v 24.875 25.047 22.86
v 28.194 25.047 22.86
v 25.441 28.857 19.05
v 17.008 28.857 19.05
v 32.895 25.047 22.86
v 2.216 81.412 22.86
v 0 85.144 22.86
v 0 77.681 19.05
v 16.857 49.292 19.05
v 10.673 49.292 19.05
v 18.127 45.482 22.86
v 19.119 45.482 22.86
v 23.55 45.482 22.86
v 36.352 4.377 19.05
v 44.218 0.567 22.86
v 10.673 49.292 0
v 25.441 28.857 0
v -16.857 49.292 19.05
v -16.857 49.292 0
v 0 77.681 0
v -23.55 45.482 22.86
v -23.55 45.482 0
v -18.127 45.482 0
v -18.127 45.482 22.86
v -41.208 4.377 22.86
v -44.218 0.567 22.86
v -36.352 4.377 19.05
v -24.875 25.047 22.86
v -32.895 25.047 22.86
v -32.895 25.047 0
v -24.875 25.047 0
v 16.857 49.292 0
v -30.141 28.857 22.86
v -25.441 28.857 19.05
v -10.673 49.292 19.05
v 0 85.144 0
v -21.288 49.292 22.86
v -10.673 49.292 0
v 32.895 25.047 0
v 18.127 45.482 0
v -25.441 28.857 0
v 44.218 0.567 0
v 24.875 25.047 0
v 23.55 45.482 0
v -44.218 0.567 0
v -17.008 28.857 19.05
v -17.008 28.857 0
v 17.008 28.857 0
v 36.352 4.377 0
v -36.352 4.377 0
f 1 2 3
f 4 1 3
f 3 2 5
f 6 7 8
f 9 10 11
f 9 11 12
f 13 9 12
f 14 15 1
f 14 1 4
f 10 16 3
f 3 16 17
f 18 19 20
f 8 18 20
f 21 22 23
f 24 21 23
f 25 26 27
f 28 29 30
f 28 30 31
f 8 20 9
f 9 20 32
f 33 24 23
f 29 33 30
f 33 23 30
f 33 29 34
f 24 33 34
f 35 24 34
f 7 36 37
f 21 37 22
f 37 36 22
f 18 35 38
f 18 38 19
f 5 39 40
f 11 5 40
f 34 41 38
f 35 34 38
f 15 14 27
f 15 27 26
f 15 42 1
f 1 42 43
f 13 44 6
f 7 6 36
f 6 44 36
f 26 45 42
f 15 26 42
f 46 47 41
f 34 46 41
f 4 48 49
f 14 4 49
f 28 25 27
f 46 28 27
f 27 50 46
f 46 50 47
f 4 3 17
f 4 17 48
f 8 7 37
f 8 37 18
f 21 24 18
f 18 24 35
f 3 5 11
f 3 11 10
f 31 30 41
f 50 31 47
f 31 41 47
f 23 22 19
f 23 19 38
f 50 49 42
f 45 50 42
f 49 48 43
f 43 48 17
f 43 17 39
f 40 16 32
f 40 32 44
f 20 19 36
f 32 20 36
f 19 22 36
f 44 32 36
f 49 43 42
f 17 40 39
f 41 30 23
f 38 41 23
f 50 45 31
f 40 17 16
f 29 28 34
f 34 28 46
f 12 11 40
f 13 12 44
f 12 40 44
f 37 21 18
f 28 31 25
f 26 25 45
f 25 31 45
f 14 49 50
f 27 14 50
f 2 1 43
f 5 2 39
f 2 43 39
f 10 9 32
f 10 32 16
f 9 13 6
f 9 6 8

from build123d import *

# Parameters (mm, degrees)
F1_DEPTH     = 25.4
F2_T4_DEPTH  = 57.8731292872
F2_T9_DEPTH  = 41.0926802964
F2_T14_DEPTH = 63.860720941
F2_T19_DEPTH = 105.3637727113
F2_T25_DEPTH = 63.860720941
F2_T30_DEPTH = 41.0926802964
F2_T35_DEPTH = 57.8731292872
F2_T40_DEPTH = 38.84406527
F2_T45_DEPTH = 65.6766537471
F2_T51_DEPTH = 65.6766537471
F2_T57_DEPTH = 38.84406527


# Not quite as in the source:
# - a fillet or chamfer that OpenCascade refuses, or shapes differently, is made with other operations: its cross-section is extruded or revolved along the edge and cut away or added


with BuildPart() as f1:
    # F0 (on Top) → F1 (new body)
    with BuildSketch(Plane.XY):
        Polygon((-44.2180235174, 0.5666213692), (0, 0.5666213692), (44.2180235174, 0.5666213692), (24.8746419192, 25.0471287349), (32.8946120205, 25.0471287349), (18.1270946377, 45.4824770849), (23.5501605907, 45.4824770849), (0, 85.1436531389), (-23.5501605907, 45.4824770849), (-18.1270946377, 45.4824770849), (-32.8946120205, 25.0471287349), (-24.8746419192, 25.0471287349), align=None)
        Polygon((36.3516993821, 4.3766213692), (0, 4.3766213692), (-36.3516993821, 4.3766213692), (-17.0083177839, 28.8571287349), (-25.4406241332, 28.8571287349), (-10.6731067504, 49.2924770849), (-16.8567980732, 49.2924770849), (0, 77.6812616757), (16.8567980732, 49.2924770849), (10.6731067504, 49.2924770849), (25.4406241332, 28.8571287349), (17.0083177839, 28.8571287349), align=None, mode=Mode.SUBTRACT)
    extrude(amount=F1_DEPTH)

    # F2: chamfer of 6.35 on 11 edges, made by hand


with BuildPart() as f2_tool2:
    # F2_s3 → F2_t4 (new body)
    with BuildSketch(Plane(origin=(-29.3040400955, 40.5510453716, 0), x_dir=(0, 0, 1), z_dir=(0.585716126, -0.8105162674, 0))):
        Polygon((25.4, -43.8721253629), (19.05, -37.5221253629), (25.4, -37.5221253629), align=None)
    extrude(amount=F2_T4_DEPTH)

    split(bisect_by=Plane(origin=(0, 23.9535643674, 23.9535643674), x_dir=(1, 0, 0), z_dir=(0, 0.7071067812, 0.7071067812)), keep=Keep.TOP)


with BuildPart() as f1_1:
    add(f1.part)

    # F2_t1: cut F2_tool2
    add(f2_tool2.part, mode=Mode.SUBTRACT)


with BuildPart() as f2_tool7:
    # F2_s8 → F2_t9 (new body)
    with BuildSketch(Plane.YZ.offset(41.7708111067)):
        Polygon((22.5071287349, 25.4), (28.8571287349, 19.05), (28.8571287349, 25.4), align=None)
    extrude(amount=-F2_T9_DEPTH)

    split(bisect_by=Plane(origin=(7.4859790504, 5.409710853, -9.2360626814), x_dir=(0.585716126, -0.8105162674, 0), z_dir=(-0.573121549, -0.4141638445, 0.7071067812)), keep=Keep.TOP)


with BuildPart() as f1_2:
    add(f1_1.part)

    # F2_t6: cut F2_tool7
    add(f2_tool7.part, mode=Mode.SUBTRACT)


with BuildPart() as f2_tool12:
    # F2_s13 → F2_t14 (new body)
    with BuildSketch(Plane(origin=(-17.6242588903, 22.3048280047, 0), x_dir=(0, 0, 1), z_dir=(0.6199732843, -0.7846229201, 0))):
        Polygon((25.4, -37.5857648435), (19.05, -31.2357648435), (25.4, -31.2357648435), align=None)
    extrude(amount=F2_T14_DEPTH)

    split(bisect_by=Plane(origin=(0, 11.7133106846, 11.7133106846), x_dir=(1, 0, 0), z_dir=(0, 0.7071067812, 0.7071067812)), keep=Keep.TOP)


with BuildPart() as f1_3:
    add(f1_2.part)

    # F2_t11: cut F2_tool12
    add(f2_tool12.part, mode=Mode.SUBTRACT)


with BuildPart() as f2_tool17:
    # F2_s18 → F2_t19 (new body)
    with BuildSketch(Plane.YZ.offset(-52.6818863557)):
        Polygon((-1.9733786308, 25.4), (4.3766213692, 19.05), (4.3766213692, 25.4), align=None)
    extrude(amount=F2_T19_DEPTH)

    split(bisect_by=Plane(origin=(4.7806151974, 3.7774243261, -6.0928824217), x_dir=(0.6199732843, -0.7846229201, 0), z_dir=(-0.5548121875, -0.4383873135, 0.7071067812)), keep=Keep.TOP)

    split(bisect_by=Plane(origin=(-4.7806151974, 3.7774243261, -6.0928824217), x_dir=(0.6199732843, 0.7846229201, 0), z_dir=(0.5548121875, -0.4383873135, 0.7071067812)), keep=Keep.TOP)


with BuildPart() as f1_4:
    add(f1_3.part)

    # F2_t16: cut F2_tool17
    add(f2_tool17.part, mode=Mode.SUBTRACT)


with BuildPart() as f2_tool23:
    # F2_s24 → F2_t25 (new body)
    with BuildSketch(Plane(origin=(-21.9676820116, -27.8017573382, 0), x_dir=(0, 0, 1), z_dir=(0.6199732843, 0.7846229201, 0))):
        Polygon((25.4, -37.5857648435), (19.05, -31.2357648435), (25.4, -31.2357648435), align=None)
    extrude(amount=F2_T25_DEPTH)

    split(bisect_by=Plane(origin=(0, 11.7133106846, 11.7133106846), x_dir=(1, 0, 0), z_dir=(0, 0.7071067812, 0.7071067812)), keep=Keep.TOP)


with BuildPart() as f1_5:
    add(f1_4.part)

    # F2_t22: cut F2_tool23
    add(f2_tool23.part, mode=Mode.SUBTRACT)


with BuildPart() as f2_tool28:
    # F2_s29 → F2_t30 (new body)
    with BuildSketch(Plane.YZ.offset(-0.6781308103)):
        Polygon((22.5071287349, 25.4), (28.8571287349, 19.05), (28.8571287349, 25.4), align=None)
    extrude(amount=-F2_T30_DEPTH)

    split(bisect_by=Plane(origin=(-7.4859790504, 5.409710853, -9.2360626814), x_dir=(0.585716126, 0.8105162674, 0), z_dir=(0.573121549, -0.4141638445, 0.7071067812)), keep=Keep.TOP)


with BuildPart() as f1_6:
    add(f1_5.part)

    # F2_t27: cut F2_tool28
    add(f2_tool28.part, mode=Mode.SUBTRACT)


with BuildPart() as f2_tool33:
    # F2_s34 → F2_t35 (new body)
    with BuildSketch(Plane(origin=(-4.5931849883, -6.3560673631, 0), x_dir=(0, 0, 1), z_dir=(0.585716126, 0.8105162674, 0))):
        Polygon((25.4, -43.8721253629), (19.05, -37.5221253629), (25.4, -37.5221253629), align=None)
    extrude(amount=F2_T35_DEPTH)

    split(bisect_by=Plane(origin=(0, 23.9535643674, 23.9535643674), x_dir=(1, 0, 0), z_dir=(0, 0.7071067812, 0.7071067812)), keep=Keep.TOP)


with BuildPart() as f1_7:
    add(f1_6.part)

    # F2_t32: cut F2_tool33
    add(f2_tool33.part, mode=Mode.SUBTRACT)


with BuildPart() as f2_tool38:
    # F2_s39 → F2_t40 (new body)
    with BuildSketch(Plane.YZ.offset(5.6570802232)):
        Polygon((42.9424770849, 25.4), (49.2924770849, 19.05), (49.2924770849, 25.4), align=None)
    extrude(amount=-F2_T40_DEPTH)

    split(bisect_by=Plane(origin=(-8.8610845664, 5.2615677423, -10.3054798432), x_dir=(0.5105601896, 0.8598420162, 0), z_dir=(0.6080001204, -0.3610205722, 0.7071067812)), keep=Keep.TOP)


with BuildPart() as f1_8:
    add(f1_7.part)

    # F2_t37: cut F2_tool38
    add(f2_tool38.part, mode=Mode.SUBTRACT)


with BuildPart() as f2_tool43:
    # F2_s44 → F2_t45 (new body)
    with BuildSketch(Plane(origin=(8.9078181115, 15.0017890968, 0), x_dir=(0, 0, 1), z_dir=(0.5105601896, 0.8598420162, 0))):
        Polygon((25.4, -46.0109596864), (19.05, -39.6609596864), (25.4, -39.6609596864), align=None)
    extrude(amount=F2_T45_DEPTH)

    split(bisect_by=Plane(origin=(0, 34.1712385424, 34.1712385424), x_dir=(1, 0, 0), z_dir=(0, 0.7071067812, 0.7071067812)), keep=Keep.TOP)

    split(bisect_by=Plane(origin=(8.8610845664, 5.2615677423, -10.3054798432), x_dir=(0.5105601896, -0.8598420162, 0), z_dir=(-0.6080001204, -0.3610205722, 0.7071067812)), keep=Keep.TOP)


with BuildPart() as f1_9:
    add(f1_8.part)

    # F2_t42: cut F2_tool43
    add(f2_tool43.part, mode=Mode.SUBTRACT)


with BuildPart() as f2_tool49:
    # F2_s50 → F2_t51 (new body)
    with BuildSketch(Plane(origin=(-42.4397028983, 71.4733354725, 0), x_dir=(0, 0, 1), z_dir=(0.5105601896, -0.8598420162, 0))):
        Polygon((25.4, -46.0109596864), (19.05, -39.6609596864), (25.4, -39.6609596864), align=None)
    extrude(amount=F2_T51_DEPTH)

    split(bisect_by=Plane(origin=(-8.8610845664, 5.2615677423, -10.3054798432), x_dir=(0.5105601896, 0.8598420162, 0), z_dir=(0.6080001204, -0.3610205722, 0.7071067812)), keep=Keep.TOP)

    split(bisect_by=Plane(origin=(0, 34.1712385424, 34.1712385424), x_dir=(1, 0, 0), z_dir=(0, 0.7071067812, 0.7071067812)), keep=Keep.TOP)


with BuildPart() as f1_10:
    add(f1_9.part)

    # F2_t48: cut F2_tool49
    add(f2_tool49.part, mode=Mode.SUBTRACT)


with BuildPart() as f2_tool55:
    # F2_s56 → F2_t57 (new body)
    with BuildSketch(Plane.YZ.offset(33.1869850468)):
        Polygon((42.9424770849, 25.4), (49.2924770849, 19.05), (49.2924770849, 25.4), align=None)
    extrude(amount=-F2_T57_DEPTH)

    split(bisect_by=Plane(origin=(8.8610845664, 5.2615677423, -10.3054798432), x_dir=(0.5105601896, -0.8598420162, 0), z_dir=(-0.6080001204, -0.3610205722, 0.7071067812)), keep=Keep.TOP)


with BuildPart() as f1_11:
    add(f1_10.part)

    # F2_t54: cut F2_tool55
    add(f2_tool55.part, mode=Mode.SUBTRACT)


solid = f1_11.part
